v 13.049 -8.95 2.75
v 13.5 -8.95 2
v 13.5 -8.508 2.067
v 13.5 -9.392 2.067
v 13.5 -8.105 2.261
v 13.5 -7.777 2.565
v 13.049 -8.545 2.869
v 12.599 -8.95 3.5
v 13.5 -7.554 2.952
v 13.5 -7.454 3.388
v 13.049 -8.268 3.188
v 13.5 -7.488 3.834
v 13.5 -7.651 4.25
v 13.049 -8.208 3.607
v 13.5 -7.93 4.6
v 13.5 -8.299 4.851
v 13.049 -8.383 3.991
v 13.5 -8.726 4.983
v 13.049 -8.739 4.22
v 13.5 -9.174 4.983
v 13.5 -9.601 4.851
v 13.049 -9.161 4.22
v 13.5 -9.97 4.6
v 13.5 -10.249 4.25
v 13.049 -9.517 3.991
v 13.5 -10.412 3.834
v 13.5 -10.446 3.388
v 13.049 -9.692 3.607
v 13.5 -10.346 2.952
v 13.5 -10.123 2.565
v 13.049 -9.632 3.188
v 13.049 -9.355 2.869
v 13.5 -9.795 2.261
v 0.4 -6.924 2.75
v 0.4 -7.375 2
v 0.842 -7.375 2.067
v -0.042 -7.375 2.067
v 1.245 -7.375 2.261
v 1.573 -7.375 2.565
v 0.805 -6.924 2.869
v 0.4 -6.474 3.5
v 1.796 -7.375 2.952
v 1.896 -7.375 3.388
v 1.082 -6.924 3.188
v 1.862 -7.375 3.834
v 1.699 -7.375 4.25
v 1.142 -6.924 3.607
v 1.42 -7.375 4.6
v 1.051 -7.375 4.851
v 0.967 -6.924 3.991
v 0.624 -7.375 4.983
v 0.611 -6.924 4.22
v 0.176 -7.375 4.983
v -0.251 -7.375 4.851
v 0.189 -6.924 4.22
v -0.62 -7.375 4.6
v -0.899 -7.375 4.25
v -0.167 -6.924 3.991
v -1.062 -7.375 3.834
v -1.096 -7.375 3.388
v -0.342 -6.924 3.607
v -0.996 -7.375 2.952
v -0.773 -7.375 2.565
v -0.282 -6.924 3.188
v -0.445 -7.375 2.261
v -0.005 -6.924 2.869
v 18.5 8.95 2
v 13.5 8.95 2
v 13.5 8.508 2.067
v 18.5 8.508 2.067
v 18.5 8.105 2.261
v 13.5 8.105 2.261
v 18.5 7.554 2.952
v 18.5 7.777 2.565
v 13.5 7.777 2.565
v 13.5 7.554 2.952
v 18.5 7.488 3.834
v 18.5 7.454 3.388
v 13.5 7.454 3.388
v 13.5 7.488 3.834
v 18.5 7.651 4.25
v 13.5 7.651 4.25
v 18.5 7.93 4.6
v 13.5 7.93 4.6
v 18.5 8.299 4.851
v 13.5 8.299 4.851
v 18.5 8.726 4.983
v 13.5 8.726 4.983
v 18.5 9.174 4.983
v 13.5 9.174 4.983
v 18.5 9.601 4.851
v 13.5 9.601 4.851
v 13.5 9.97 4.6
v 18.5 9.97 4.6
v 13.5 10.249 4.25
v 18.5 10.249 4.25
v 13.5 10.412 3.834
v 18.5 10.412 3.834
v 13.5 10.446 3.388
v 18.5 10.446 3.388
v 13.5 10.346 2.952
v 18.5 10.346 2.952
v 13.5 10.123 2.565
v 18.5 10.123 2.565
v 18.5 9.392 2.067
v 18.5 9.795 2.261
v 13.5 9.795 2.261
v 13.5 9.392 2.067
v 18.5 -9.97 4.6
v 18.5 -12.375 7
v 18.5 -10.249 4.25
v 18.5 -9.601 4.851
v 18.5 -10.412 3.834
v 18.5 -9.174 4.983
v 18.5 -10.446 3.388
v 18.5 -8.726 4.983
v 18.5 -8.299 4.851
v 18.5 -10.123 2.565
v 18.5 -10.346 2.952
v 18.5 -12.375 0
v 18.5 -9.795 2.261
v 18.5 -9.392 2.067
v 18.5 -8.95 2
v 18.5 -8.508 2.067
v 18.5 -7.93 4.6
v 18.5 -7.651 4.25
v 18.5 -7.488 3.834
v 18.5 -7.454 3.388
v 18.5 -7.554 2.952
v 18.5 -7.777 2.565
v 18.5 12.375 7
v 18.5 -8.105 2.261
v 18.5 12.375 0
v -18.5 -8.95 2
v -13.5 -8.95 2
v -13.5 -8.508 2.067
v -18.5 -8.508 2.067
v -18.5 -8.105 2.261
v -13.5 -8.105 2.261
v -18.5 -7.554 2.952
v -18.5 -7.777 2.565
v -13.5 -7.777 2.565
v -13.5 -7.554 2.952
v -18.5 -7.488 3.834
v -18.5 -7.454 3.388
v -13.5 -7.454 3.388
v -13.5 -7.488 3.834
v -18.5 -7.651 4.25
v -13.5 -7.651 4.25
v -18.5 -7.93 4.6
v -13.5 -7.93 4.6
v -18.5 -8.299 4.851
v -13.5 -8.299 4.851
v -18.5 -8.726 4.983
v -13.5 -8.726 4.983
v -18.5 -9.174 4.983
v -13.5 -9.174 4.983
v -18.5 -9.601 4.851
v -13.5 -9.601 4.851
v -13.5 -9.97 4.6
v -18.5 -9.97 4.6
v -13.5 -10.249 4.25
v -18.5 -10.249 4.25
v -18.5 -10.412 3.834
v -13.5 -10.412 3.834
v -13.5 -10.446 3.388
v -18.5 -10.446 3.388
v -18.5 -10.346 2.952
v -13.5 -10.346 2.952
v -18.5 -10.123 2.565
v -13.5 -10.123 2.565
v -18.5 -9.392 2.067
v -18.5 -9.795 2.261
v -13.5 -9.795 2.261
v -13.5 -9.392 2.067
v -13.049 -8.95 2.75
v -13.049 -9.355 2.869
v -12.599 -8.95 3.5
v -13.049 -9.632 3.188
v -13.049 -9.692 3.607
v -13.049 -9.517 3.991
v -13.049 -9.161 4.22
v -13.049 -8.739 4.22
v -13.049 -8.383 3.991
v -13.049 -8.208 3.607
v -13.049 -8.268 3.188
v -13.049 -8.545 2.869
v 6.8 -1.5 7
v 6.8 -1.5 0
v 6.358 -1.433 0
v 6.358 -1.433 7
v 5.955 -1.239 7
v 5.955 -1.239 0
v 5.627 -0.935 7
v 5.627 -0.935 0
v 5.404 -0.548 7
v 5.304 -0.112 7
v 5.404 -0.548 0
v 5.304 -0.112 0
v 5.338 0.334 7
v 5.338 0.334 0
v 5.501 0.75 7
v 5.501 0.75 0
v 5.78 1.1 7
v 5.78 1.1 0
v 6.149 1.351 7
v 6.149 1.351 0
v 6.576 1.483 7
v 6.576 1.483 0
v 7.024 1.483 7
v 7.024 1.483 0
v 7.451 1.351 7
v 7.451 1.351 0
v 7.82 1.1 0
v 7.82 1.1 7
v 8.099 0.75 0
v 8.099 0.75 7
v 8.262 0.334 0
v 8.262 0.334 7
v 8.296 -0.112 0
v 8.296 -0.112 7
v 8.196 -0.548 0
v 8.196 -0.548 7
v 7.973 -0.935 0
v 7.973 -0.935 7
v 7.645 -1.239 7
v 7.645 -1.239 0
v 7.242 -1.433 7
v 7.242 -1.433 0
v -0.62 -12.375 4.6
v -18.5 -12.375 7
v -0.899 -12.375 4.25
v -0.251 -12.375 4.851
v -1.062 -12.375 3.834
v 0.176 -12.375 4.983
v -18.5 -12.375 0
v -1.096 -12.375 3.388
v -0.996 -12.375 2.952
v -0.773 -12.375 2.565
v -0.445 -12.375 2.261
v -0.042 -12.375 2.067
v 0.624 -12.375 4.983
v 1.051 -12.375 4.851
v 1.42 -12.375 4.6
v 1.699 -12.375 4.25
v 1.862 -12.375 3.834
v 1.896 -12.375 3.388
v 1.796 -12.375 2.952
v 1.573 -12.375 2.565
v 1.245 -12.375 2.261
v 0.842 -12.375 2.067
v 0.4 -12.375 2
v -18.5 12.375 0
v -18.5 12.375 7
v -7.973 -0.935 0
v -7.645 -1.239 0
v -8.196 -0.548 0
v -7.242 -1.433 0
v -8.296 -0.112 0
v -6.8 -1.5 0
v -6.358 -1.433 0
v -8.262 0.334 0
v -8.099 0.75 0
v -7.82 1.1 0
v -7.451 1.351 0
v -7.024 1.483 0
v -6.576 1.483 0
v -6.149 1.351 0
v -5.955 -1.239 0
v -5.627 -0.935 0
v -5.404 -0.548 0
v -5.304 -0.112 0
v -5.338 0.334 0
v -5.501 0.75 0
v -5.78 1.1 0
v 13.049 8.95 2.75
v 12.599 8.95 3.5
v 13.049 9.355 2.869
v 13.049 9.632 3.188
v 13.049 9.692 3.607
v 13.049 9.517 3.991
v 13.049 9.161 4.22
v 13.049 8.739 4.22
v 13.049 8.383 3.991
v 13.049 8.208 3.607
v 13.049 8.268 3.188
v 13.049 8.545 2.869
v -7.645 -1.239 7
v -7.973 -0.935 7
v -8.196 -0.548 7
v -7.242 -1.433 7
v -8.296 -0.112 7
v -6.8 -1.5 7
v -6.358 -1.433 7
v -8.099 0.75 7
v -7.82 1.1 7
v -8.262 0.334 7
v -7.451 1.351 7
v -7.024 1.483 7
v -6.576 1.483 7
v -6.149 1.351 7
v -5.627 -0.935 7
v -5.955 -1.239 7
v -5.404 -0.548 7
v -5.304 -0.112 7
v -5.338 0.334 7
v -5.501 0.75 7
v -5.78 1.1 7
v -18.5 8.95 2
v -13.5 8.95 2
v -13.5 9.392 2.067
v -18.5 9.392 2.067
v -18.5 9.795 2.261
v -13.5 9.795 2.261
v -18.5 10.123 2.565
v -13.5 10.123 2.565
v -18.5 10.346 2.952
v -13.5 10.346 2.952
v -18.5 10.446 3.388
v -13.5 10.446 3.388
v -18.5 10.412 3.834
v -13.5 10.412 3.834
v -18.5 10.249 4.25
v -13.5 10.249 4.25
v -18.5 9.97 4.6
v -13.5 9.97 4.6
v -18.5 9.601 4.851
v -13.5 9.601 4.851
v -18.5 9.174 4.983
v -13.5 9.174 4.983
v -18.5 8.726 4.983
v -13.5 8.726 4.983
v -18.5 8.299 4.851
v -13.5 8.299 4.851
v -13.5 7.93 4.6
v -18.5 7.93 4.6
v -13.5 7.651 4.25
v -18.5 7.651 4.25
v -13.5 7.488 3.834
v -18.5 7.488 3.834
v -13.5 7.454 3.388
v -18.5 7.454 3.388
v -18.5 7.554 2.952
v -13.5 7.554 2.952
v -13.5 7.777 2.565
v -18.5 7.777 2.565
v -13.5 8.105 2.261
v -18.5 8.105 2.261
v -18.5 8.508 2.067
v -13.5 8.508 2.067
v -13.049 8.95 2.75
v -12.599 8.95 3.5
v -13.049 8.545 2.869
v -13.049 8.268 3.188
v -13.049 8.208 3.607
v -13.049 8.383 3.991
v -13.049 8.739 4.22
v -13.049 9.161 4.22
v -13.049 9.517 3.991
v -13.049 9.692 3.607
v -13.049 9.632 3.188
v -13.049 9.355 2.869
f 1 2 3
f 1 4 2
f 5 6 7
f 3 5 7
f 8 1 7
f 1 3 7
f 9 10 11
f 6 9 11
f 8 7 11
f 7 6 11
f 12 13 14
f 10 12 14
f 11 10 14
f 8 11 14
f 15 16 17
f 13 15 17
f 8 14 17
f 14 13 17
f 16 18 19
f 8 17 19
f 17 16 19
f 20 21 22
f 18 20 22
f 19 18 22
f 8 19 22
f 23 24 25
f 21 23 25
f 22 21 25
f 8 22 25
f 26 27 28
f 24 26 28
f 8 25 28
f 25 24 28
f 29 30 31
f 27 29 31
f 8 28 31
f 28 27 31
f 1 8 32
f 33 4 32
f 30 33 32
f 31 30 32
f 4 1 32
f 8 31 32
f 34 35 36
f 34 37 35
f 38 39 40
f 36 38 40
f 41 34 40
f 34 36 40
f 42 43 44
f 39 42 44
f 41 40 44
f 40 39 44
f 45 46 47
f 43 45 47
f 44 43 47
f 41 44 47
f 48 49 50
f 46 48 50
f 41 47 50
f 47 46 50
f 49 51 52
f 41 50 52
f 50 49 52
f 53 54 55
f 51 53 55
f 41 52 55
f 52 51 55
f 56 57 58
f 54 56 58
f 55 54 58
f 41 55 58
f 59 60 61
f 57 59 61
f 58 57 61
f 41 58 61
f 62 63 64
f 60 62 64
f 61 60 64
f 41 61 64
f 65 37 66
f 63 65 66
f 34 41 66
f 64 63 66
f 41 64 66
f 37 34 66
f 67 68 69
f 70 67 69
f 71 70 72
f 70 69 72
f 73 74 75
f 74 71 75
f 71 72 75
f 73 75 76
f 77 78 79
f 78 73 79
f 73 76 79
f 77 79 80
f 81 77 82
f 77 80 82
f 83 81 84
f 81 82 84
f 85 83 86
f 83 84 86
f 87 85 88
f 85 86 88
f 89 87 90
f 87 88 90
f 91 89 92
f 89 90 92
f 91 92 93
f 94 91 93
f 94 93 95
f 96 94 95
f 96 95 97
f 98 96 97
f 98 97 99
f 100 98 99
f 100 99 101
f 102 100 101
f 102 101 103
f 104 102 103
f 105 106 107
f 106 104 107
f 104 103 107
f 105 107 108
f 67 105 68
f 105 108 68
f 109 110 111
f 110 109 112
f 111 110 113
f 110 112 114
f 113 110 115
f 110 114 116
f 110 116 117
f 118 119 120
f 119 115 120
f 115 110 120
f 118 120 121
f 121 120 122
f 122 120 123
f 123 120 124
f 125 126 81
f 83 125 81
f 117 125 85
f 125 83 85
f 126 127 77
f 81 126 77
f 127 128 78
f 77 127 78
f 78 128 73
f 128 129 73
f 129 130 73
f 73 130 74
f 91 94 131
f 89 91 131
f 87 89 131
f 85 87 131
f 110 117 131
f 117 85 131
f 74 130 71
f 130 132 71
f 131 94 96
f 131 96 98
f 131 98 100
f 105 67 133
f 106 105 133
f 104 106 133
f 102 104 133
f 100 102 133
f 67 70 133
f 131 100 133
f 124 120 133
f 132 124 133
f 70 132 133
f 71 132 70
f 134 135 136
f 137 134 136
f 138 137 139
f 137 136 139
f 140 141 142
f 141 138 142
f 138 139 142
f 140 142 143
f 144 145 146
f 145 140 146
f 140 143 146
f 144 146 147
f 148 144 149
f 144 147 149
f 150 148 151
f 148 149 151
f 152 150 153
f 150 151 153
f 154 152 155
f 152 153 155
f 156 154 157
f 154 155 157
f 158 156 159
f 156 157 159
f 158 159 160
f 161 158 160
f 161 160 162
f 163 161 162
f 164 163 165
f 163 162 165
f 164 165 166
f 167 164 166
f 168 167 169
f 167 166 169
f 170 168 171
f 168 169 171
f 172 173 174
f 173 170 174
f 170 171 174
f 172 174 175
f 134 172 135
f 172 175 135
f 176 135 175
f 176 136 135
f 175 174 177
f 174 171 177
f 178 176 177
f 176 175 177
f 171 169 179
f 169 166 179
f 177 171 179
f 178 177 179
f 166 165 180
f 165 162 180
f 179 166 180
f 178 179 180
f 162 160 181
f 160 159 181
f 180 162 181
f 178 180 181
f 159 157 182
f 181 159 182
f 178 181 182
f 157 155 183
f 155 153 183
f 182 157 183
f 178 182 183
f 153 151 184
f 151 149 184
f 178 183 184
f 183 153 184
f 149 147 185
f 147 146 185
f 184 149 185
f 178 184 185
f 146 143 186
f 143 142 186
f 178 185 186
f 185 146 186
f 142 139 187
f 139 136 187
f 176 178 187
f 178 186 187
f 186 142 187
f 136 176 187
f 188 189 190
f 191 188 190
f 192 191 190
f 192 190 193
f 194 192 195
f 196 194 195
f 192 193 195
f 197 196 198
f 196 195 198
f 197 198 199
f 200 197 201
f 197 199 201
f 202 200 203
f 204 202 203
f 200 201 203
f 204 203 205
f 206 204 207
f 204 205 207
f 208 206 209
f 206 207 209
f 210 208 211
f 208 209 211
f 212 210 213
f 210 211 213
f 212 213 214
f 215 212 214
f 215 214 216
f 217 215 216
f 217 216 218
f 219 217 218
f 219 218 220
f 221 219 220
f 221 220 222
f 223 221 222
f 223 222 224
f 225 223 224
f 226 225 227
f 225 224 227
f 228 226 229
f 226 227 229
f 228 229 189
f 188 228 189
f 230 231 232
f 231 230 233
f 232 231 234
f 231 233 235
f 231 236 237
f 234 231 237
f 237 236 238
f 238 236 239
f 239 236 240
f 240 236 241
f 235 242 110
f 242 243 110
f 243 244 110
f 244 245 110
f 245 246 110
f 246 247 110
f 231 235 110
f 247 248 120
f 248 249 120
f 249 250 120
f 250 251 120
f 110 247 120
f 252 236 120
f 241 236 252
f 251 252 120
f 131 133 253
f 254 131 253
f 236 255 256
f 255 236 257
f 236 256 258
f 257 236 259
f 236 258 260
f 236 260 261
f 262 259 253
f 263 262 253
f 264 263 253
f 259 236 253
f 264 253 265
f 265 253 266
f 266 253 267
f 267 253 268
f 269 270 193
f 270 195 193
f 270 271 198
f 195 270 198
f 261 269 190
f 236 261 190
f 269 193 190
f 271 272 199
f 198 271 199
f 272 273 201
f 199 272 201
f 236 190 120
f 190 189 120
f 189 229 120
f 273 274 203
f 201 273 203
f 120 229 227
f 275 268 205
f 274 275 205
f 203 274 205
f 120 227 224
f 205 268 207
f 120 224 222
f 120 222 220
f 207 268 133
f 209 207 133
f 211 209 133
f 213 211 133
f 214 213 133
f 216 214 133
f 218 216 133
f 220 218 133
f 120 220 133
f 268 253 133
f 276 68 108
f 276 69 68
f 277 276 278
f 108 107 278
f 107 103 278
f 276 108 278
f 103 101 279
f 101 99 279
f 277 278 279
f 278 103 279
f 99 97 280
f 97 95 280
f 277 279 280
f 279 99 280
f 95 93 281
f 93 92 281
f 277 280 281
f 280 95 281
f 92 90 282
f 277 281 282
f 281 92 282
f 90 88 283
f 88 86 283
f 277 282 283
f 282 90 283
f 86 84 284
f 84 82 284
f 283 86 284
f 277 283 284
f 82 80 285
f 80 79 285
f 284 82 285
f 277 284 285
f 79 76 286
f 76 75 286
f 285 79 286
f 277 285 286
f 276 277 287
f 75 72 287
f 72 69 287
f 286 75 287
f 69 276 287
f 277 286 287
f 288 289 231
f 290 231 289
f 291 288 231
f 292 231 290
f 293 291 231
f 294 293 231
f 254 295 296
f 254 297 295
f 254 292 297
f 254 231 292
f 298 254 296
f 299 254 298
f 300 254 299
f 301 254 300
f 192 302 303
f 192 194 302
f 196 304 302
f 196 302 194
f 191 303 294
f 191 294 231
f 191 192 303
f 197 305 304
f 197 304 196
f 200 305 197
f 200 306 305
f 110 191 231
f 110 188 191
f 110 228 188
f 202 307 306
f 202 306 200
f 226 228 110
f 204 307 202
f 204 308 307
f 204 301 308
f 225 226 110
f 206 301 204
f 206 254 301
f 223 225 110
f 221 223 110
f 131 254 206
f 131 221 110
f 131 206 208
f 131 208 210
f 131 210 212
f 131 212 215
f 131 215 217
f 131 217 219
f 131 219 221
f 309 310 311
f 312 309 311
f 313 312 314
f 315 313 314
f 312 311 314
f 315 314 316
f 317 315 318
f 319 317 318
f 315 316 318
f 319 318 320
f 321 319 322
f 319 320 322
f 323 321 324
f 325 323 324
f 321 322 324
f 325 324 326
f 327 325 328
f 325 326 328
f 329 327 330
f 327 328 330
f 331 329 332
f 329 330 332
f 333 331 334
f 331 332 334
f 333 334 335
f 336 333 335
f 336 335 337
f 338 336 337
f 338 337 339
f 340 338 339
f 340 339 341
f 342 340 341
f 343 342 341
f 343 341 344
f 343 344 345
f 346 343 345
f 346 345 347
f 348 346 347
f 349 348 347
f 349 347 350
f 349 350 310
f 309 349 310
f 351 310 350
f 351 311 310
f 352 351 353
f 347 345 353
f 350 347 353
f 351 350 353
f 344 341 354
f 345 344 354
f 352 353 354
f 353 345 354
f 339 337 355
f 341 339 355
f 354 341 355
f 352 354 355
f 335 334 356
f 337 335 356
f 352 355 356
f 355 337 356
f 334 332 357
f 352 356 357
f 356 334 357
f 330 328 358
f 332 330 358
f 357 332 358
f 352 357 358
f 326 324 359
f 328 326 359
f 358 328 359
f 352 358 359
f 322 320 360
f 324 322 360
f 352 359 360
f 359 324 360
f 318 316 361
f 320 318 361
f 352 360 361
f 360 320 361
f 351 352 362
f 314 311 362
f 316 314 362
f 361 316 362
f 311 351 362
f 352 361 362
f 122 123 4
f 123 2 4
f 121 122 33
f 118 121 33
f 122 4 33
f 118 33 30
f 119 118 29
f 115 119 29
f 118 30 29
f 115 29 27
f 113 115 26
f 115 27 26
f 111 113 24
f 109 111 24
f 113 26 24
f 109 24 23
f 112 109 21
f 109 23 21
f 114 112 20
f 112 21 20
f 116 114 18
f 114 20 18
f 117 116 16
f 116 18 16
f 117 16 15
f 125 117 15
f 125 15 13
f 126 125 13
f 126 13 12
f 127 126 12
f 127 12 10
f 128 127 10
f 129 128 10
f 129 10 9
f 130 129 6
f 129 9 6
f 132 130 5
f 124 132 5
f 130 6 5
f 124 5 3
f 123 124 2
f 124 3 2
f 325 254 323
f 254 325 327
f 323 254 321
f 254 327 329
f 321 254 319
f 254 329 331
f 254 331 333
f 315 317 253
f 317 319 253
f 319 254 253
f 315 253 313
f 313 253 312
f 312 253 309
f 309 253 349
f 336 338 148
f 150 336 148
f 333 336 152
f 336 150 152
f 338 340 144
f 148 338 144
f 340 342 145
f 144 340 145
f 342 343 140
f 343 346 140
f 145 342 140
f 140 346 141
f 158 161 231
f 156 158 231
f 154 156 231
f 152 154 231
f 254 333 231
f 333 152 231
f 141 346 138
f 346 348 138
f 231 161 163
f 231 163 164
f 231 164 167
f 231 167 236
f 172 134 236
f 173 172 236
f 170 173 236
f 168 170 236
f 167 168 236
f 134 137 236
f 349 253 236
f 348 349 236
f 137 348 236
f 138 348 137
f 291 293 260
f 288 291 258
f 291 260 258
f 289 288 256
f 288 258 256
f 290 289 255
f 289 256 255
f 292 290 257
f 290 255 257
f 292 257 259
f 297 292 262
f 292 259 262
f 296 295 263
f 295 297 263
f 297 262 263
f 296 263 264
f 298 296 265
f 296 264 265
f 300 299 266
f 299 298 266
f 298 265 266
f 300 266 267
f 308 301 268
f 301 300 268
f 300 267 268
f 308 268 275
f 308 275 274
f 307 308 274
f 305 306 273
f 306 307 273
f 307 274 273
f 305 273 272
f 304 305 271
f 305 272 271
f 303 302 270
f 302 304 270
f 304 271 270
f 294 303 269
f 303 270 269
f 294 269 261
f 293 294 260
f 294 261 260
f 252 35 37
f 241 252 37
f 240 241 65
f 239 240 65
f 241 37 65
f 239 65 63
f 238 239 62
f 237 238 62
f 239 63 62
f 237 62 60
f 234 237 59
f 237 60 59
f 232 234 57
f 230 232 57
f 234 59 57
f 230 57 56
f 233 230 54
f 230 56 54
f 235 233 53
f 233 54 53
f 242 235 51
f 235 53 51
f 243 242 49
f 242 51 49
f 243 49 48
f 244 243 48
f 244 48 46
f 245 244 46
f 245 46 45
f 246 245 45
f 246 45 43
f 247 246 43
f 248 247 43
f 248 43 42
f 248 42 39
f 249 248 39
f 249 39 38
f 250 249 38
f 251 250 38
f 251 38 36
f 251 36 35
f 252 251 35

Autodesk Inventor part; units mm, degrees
ref_plane "YZ Plane" through (0, 0, 0) normal (1, 0, 0) x (0, 1, 0)
ref_plane "XZ Plane" through (0, 0, 0) normal (0, 1, 0) x (-1, 0, 0)
ref_plane "XY Plane" through (0, 0, 0) normal (0, 0, 1) x (1, 0, 0)
sketch "Sketch1" plane through (0, 0, 0) normal (0, 0, 1) x (1, 0, 0)
  line L0 (-18.5, -12.375) -> (18.5, -12.375)
  line L1 (18.5, -12.375) -> (18.5, 12.375)
  line L2 (18.5, 12.375) -> (-18.5, 12.375)
  line L3 (-18.5, 12.375) -> (-18.5, -12.375)
  line L4 (-18.5, -12.375) -> (18.5, 12.375) construction
  line L5 (18.5, -12.375) -> (-18.5, 12.375) construction
  point P0 (0, 0)
  dimension "d0" = 37
  dimension "d1" = 24.75
extrude "Extrusion1" add sketch "Sketch1" along normal blind 7
sketch "Sketch2" plane through (18.5, -12.375, 0) normal (1, 0, 0) x (0, 0, -1)
  circle A0 centre (-3.5, 3.425) radius 1.5
  line L0 (-7, 0) -> (-7, 24.75) projected
  line L1 (0, 0) -> (-7, 0) projected
  point P0 (0, 12.375)
  point P1 (-3.5, 0)
  dimension "d4" = 3
  dimension "d5" = 3.5
  dimension "d6" = 3.425
hole "Hole1" at (18.5, -8.95, 3.5) direction (-1, 0, 0) diameter 3 depth 5 tip angle 118
mirror "Mirror1" about plane through (0, 0, 0) normal (0, 1, 0) of "Hole1"
mirror "Mirror2" about plane through (0, 0, 0) normal (1, 0, 0) of "Hole1", "Mirror1"
sketch "Sketch3" plane through (0, 0, 7) normal (0, 0, 1) x (1, 0, 0)
  circle A0 centre (6.8, 0) radius 1.5
  line L0 (18.5, 12.375) -> (-18.5, 12.375) projected
  line L1 (18.5, -12.375) -> (18.5, 12.375) projected
  point P0 (0, 0)
  dimension "d14" = 3
  dimension "d15" = 12.375
  dimension "d16" = 11.7
hole "Hole2" at (6.8, 0, 7) direction (0, 0, -1) diameter 3 end through all
mirror "Mirror3" about plane through (0, 0, 0) normal (1, 0, 0) of "Hole2"
sketch "Sketch4" plane through (-18.5, -12.375, 0) normal (0, -1, 0) x (1, 0, 0)
  circle A0 centre (18.9, 3.5) radius 1.5
  line L0 (0, 7) -> (37, 7) projected
  line L1 (0, 0) -> (0, 7) projected
  point P0 (18.5, 0)
  dimension "d24" = 3
  dimension "d25" = 3.5
  dimension "d26" = 18.9
hole "Hole3" at (0.4, -12.375, 3.5) direction (0, 1, 0) diameter 3 depth 5 tip angle 118
properties part number "Mold_BackWall"
